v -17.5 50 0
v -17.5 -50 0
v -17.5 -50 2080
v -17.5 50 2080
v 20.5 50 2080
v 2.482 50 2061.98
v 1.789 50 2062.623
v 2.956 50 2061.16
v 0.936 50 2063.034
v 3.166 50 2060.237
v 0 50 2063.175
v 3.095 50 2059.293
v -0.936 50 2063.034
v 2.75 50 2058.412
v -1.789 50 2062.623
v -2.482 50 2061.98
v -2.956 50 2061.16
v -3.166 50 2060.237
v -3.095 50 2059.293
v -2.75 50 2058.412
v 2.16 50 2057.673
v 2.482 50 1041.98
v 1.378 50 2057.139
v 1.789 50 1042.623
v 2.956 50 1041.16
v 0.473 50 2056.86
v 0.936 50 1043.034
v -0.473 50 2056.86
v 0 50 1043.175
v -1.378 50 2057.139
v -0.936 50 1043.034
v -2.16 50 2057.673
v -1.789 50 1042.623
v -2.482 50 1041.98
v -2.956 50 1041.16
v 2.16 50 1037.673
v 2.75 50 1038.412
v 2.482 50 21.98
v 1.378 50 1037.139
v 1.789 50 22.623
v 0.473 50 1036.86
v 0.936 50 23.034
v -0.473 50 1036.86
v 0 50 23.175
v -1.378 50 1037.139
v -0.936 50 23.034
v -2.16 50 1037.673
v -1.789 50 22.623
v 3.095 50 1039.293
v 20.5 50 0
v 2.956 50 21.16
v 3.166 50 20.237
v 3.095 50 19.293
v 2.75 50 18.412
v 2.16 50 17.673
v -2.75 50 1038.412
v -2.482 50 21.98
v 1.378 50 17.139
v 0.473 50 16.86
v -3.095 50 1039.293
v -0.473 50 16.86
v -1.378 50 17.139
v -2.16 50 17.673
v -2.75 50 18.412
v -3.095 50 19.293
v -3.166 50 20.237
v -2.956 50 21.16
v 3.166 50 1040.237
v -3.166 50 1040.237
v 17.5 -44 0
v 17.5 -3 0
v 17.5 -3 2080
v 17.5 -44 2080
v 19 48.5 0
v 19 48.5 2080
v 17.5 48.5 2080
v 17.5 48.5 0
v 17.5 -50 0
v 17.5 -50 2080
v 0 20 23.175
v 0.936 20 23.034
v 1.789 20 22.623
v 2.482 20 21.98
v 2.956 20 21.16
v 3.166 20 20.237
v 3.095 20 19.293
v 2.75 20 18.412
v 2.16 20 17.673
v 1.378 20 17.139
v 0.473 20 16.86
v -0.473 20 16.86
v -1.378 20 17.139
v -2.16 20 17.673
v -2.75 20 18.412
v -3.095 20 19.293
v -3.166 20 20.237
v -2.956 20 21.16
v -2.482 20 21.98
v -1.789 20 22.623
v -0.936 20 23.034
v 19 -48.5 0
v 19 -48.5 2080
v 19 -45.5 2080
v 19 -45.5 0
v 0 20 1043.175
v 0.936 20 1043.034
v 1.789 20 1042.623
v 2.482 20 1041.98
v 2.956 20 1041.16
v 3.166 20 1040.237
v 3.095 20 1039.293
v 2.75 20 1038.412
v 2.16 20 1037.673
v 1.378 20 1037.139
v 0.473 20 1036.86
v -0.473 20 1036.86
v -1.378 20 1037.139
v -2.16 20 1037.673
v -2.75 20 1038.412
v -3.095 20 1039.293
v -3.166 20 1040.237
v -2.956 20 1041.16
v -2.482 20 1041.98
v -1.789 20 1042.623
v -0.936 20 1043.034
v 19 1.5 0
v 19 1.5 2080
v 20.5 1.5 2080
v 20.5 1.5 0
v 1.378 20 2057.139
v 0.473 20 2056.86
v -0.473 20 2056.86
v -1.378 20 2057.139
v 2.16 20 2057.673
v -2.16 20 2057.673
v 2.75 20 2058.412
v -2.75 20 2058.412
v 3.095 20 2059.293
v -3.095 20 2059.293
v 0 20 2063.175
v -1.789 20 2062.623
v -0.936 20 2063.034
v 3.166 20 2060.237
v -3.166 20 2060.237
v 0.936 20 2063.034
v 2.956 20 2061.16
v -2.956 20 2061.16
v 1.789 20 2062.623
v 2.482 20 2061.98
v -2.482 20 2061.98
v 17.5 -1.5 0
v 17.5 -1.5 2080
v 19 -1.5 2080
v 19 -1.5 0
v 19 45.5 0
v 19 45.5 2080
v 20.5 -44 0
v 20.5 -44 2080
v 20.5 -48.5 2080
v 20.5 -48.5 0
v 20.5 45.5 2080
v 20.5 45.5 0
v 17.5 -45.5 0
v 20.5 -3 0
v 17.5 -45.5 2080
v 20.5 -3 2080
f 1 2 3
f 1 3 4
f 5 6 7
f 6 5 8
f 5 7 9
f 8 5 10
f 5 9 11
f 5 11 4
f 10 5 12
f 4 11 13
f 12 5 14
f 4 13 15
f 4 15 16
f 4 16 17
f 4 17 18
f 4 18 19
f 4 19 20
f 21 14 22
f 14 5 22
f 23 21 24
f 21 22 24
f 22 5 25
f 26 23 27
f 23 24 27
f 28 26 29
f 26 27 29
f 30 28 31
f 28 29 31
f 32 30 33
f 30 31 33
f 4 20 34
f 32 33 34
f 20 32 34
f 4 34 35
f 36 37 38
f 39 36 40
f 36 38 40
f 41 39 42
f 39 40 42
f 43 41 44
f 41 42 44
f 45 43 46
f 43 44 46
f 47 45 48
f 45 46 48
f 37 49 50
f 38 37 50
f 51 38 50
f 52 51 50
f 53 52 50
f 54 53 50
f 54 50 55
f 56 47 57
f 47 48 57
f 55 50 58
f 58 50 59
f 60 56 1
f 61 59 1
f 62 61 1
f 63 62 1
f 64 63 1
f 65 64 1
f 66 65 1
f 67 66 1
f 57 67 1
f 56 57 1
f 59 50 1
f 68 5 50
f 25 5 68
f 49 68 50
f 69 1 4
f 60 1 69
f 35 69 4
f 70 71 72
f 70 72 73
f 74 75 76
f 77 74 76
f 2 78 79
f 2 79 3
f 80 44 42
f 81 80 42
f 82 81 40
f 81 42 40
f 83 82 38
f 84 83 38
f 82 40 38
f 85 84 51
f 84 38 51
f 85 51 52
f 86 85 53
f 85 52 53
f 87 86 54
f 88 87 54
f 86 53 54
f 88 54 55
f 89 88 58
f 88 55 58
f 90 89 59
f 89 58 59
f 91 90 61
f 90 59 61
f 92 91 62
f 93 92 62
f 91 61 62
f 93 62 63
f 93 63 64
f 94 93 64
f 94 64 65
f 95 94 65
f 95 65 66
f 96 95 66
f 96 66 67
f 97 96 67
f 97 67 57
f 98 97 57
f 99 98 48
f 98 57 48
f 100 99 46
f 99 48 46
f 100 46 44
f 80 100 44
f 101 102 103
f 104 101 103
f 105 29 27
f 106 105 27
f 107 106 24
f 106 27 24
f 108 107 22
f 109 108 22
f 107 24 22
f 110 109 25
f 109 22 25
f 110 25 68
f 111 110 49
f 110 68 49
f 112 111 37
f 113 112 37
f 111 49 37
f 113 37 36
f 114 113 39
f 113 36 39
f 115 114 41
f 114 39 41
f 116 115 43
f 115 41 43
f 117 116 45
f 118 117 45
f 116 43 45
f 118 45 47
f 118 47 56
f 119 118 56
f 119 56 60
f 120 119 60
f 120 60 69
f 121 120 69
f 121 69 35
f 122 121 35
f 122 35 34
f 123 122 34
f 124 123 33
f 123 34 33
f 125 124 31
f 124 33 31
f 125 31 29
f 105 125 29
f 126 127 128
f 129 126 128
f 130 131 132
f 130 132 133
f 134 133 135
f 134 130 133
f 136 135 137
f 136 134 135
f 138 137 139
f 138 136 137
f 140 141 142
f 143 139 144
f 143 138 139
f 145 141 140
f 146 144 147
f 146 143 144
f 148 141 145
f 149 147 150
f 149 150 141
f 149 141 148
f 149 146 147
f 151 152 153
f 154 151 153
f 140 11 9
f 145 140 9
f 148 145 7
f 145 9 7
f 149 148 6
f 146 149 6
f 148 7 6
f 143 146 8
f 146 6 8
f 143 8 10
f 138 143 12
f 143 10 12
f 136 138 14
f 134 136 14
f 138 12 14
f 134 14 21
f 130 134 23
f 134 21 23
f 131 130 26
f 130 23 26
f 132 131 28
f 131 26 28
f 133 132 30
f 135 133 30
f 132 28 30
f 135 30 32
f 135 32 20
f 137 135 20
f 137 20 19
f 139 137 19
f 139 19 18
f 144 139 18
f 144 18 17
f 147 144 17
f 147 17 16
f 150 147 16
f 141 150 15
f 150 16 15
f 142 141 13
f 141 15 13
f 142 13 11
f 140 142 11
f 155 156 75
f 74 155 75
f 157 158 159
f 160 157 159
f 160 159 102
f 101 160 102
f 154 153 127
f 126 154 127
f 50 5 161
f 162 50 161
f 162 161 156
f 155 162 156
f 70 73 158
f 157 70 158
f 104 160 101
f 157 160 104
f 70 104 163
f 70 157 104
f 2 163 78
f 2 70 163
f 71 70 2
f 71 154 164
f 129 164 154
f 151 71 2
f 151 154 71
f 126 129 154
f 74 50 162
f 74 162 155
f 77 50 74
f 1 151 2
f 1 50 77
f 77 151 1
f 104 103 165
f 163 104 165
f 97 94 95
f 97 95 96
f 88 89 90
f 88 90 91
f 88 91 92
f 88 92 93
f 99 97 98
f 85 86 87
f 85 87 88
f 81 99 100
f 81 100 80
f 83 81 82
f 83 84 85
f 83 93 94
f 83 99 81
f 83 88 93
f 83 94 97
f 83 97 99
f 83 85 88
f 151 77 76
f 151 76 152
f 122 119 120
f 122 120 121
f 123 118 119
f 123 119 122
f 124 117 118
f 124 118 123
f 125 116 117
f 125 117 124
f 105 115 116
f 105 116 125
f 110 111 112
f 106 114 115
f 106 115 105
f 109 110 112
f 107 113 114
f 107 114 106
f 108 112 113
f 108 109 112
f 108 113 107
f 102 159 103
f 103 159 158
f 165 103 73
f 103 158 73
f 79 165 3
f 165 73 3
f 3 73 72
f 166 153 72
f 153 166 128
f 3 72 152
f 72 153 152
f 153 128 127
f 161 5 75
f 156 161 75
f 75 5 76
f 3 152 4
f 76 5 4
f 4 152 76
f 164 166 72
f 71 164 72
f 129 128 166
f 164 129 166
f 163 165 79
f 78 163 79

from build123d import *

# Parameters (mm, degrees)
SALIENTE_EXTRUIR1_DEPTH = 2080
CROQUIS2_R              = 3.175
CORTAR_EXTRUIR1_DEPTH   = 30


with BuildPart() as part:
    # Croquis1 → Saliente-Extruir1 (new body)
    with BuildSketch(Plane.XY):
        Polygon((17.5, 50), (20.5, 50), (20.5, 45.5), (19, 45.5), (19, 48.5), (17.5, 48.5), (17.5, -1.5), (19, -1.5), (19, 1.5), (20.5, 1.5), (20.5, -3), (17.5, -3), (17.5, -44), (20.5, -44), (20.5, -48.5), (19, -48.5), (19, -45.5), (17.5, -45.5), (17.5, -50), (-17.5, -50), (-17.5, 50), align=None)
    extrude(amount=SALIENTE_EXTRUIR1_DEPTH)

    # Croquis2 → Cortar-Extruir1 (cut)
    with BuildSketch(Plane(origin=(0, 50, 0), x_dir=(1, 0, 0), z_dir=(0, 1, 0))):
        with Locations(Location((0, -20, 0), (0, 0, 270))):
            Circle(CROQUIS2_R)
        with Locations(Location((0, -1040, 0), (0, 0, 270))):
            Circle(CROQUIS2_R)
        with Locations(Location((0, -2060, 0), (0, 0, 270))):
            Circle(CROQUIS2_R)
    extrude(amount=-CORTAR_EXTRUIR1_DEPTH, mode=Mode.SUBTRACT)


solid = part.part
